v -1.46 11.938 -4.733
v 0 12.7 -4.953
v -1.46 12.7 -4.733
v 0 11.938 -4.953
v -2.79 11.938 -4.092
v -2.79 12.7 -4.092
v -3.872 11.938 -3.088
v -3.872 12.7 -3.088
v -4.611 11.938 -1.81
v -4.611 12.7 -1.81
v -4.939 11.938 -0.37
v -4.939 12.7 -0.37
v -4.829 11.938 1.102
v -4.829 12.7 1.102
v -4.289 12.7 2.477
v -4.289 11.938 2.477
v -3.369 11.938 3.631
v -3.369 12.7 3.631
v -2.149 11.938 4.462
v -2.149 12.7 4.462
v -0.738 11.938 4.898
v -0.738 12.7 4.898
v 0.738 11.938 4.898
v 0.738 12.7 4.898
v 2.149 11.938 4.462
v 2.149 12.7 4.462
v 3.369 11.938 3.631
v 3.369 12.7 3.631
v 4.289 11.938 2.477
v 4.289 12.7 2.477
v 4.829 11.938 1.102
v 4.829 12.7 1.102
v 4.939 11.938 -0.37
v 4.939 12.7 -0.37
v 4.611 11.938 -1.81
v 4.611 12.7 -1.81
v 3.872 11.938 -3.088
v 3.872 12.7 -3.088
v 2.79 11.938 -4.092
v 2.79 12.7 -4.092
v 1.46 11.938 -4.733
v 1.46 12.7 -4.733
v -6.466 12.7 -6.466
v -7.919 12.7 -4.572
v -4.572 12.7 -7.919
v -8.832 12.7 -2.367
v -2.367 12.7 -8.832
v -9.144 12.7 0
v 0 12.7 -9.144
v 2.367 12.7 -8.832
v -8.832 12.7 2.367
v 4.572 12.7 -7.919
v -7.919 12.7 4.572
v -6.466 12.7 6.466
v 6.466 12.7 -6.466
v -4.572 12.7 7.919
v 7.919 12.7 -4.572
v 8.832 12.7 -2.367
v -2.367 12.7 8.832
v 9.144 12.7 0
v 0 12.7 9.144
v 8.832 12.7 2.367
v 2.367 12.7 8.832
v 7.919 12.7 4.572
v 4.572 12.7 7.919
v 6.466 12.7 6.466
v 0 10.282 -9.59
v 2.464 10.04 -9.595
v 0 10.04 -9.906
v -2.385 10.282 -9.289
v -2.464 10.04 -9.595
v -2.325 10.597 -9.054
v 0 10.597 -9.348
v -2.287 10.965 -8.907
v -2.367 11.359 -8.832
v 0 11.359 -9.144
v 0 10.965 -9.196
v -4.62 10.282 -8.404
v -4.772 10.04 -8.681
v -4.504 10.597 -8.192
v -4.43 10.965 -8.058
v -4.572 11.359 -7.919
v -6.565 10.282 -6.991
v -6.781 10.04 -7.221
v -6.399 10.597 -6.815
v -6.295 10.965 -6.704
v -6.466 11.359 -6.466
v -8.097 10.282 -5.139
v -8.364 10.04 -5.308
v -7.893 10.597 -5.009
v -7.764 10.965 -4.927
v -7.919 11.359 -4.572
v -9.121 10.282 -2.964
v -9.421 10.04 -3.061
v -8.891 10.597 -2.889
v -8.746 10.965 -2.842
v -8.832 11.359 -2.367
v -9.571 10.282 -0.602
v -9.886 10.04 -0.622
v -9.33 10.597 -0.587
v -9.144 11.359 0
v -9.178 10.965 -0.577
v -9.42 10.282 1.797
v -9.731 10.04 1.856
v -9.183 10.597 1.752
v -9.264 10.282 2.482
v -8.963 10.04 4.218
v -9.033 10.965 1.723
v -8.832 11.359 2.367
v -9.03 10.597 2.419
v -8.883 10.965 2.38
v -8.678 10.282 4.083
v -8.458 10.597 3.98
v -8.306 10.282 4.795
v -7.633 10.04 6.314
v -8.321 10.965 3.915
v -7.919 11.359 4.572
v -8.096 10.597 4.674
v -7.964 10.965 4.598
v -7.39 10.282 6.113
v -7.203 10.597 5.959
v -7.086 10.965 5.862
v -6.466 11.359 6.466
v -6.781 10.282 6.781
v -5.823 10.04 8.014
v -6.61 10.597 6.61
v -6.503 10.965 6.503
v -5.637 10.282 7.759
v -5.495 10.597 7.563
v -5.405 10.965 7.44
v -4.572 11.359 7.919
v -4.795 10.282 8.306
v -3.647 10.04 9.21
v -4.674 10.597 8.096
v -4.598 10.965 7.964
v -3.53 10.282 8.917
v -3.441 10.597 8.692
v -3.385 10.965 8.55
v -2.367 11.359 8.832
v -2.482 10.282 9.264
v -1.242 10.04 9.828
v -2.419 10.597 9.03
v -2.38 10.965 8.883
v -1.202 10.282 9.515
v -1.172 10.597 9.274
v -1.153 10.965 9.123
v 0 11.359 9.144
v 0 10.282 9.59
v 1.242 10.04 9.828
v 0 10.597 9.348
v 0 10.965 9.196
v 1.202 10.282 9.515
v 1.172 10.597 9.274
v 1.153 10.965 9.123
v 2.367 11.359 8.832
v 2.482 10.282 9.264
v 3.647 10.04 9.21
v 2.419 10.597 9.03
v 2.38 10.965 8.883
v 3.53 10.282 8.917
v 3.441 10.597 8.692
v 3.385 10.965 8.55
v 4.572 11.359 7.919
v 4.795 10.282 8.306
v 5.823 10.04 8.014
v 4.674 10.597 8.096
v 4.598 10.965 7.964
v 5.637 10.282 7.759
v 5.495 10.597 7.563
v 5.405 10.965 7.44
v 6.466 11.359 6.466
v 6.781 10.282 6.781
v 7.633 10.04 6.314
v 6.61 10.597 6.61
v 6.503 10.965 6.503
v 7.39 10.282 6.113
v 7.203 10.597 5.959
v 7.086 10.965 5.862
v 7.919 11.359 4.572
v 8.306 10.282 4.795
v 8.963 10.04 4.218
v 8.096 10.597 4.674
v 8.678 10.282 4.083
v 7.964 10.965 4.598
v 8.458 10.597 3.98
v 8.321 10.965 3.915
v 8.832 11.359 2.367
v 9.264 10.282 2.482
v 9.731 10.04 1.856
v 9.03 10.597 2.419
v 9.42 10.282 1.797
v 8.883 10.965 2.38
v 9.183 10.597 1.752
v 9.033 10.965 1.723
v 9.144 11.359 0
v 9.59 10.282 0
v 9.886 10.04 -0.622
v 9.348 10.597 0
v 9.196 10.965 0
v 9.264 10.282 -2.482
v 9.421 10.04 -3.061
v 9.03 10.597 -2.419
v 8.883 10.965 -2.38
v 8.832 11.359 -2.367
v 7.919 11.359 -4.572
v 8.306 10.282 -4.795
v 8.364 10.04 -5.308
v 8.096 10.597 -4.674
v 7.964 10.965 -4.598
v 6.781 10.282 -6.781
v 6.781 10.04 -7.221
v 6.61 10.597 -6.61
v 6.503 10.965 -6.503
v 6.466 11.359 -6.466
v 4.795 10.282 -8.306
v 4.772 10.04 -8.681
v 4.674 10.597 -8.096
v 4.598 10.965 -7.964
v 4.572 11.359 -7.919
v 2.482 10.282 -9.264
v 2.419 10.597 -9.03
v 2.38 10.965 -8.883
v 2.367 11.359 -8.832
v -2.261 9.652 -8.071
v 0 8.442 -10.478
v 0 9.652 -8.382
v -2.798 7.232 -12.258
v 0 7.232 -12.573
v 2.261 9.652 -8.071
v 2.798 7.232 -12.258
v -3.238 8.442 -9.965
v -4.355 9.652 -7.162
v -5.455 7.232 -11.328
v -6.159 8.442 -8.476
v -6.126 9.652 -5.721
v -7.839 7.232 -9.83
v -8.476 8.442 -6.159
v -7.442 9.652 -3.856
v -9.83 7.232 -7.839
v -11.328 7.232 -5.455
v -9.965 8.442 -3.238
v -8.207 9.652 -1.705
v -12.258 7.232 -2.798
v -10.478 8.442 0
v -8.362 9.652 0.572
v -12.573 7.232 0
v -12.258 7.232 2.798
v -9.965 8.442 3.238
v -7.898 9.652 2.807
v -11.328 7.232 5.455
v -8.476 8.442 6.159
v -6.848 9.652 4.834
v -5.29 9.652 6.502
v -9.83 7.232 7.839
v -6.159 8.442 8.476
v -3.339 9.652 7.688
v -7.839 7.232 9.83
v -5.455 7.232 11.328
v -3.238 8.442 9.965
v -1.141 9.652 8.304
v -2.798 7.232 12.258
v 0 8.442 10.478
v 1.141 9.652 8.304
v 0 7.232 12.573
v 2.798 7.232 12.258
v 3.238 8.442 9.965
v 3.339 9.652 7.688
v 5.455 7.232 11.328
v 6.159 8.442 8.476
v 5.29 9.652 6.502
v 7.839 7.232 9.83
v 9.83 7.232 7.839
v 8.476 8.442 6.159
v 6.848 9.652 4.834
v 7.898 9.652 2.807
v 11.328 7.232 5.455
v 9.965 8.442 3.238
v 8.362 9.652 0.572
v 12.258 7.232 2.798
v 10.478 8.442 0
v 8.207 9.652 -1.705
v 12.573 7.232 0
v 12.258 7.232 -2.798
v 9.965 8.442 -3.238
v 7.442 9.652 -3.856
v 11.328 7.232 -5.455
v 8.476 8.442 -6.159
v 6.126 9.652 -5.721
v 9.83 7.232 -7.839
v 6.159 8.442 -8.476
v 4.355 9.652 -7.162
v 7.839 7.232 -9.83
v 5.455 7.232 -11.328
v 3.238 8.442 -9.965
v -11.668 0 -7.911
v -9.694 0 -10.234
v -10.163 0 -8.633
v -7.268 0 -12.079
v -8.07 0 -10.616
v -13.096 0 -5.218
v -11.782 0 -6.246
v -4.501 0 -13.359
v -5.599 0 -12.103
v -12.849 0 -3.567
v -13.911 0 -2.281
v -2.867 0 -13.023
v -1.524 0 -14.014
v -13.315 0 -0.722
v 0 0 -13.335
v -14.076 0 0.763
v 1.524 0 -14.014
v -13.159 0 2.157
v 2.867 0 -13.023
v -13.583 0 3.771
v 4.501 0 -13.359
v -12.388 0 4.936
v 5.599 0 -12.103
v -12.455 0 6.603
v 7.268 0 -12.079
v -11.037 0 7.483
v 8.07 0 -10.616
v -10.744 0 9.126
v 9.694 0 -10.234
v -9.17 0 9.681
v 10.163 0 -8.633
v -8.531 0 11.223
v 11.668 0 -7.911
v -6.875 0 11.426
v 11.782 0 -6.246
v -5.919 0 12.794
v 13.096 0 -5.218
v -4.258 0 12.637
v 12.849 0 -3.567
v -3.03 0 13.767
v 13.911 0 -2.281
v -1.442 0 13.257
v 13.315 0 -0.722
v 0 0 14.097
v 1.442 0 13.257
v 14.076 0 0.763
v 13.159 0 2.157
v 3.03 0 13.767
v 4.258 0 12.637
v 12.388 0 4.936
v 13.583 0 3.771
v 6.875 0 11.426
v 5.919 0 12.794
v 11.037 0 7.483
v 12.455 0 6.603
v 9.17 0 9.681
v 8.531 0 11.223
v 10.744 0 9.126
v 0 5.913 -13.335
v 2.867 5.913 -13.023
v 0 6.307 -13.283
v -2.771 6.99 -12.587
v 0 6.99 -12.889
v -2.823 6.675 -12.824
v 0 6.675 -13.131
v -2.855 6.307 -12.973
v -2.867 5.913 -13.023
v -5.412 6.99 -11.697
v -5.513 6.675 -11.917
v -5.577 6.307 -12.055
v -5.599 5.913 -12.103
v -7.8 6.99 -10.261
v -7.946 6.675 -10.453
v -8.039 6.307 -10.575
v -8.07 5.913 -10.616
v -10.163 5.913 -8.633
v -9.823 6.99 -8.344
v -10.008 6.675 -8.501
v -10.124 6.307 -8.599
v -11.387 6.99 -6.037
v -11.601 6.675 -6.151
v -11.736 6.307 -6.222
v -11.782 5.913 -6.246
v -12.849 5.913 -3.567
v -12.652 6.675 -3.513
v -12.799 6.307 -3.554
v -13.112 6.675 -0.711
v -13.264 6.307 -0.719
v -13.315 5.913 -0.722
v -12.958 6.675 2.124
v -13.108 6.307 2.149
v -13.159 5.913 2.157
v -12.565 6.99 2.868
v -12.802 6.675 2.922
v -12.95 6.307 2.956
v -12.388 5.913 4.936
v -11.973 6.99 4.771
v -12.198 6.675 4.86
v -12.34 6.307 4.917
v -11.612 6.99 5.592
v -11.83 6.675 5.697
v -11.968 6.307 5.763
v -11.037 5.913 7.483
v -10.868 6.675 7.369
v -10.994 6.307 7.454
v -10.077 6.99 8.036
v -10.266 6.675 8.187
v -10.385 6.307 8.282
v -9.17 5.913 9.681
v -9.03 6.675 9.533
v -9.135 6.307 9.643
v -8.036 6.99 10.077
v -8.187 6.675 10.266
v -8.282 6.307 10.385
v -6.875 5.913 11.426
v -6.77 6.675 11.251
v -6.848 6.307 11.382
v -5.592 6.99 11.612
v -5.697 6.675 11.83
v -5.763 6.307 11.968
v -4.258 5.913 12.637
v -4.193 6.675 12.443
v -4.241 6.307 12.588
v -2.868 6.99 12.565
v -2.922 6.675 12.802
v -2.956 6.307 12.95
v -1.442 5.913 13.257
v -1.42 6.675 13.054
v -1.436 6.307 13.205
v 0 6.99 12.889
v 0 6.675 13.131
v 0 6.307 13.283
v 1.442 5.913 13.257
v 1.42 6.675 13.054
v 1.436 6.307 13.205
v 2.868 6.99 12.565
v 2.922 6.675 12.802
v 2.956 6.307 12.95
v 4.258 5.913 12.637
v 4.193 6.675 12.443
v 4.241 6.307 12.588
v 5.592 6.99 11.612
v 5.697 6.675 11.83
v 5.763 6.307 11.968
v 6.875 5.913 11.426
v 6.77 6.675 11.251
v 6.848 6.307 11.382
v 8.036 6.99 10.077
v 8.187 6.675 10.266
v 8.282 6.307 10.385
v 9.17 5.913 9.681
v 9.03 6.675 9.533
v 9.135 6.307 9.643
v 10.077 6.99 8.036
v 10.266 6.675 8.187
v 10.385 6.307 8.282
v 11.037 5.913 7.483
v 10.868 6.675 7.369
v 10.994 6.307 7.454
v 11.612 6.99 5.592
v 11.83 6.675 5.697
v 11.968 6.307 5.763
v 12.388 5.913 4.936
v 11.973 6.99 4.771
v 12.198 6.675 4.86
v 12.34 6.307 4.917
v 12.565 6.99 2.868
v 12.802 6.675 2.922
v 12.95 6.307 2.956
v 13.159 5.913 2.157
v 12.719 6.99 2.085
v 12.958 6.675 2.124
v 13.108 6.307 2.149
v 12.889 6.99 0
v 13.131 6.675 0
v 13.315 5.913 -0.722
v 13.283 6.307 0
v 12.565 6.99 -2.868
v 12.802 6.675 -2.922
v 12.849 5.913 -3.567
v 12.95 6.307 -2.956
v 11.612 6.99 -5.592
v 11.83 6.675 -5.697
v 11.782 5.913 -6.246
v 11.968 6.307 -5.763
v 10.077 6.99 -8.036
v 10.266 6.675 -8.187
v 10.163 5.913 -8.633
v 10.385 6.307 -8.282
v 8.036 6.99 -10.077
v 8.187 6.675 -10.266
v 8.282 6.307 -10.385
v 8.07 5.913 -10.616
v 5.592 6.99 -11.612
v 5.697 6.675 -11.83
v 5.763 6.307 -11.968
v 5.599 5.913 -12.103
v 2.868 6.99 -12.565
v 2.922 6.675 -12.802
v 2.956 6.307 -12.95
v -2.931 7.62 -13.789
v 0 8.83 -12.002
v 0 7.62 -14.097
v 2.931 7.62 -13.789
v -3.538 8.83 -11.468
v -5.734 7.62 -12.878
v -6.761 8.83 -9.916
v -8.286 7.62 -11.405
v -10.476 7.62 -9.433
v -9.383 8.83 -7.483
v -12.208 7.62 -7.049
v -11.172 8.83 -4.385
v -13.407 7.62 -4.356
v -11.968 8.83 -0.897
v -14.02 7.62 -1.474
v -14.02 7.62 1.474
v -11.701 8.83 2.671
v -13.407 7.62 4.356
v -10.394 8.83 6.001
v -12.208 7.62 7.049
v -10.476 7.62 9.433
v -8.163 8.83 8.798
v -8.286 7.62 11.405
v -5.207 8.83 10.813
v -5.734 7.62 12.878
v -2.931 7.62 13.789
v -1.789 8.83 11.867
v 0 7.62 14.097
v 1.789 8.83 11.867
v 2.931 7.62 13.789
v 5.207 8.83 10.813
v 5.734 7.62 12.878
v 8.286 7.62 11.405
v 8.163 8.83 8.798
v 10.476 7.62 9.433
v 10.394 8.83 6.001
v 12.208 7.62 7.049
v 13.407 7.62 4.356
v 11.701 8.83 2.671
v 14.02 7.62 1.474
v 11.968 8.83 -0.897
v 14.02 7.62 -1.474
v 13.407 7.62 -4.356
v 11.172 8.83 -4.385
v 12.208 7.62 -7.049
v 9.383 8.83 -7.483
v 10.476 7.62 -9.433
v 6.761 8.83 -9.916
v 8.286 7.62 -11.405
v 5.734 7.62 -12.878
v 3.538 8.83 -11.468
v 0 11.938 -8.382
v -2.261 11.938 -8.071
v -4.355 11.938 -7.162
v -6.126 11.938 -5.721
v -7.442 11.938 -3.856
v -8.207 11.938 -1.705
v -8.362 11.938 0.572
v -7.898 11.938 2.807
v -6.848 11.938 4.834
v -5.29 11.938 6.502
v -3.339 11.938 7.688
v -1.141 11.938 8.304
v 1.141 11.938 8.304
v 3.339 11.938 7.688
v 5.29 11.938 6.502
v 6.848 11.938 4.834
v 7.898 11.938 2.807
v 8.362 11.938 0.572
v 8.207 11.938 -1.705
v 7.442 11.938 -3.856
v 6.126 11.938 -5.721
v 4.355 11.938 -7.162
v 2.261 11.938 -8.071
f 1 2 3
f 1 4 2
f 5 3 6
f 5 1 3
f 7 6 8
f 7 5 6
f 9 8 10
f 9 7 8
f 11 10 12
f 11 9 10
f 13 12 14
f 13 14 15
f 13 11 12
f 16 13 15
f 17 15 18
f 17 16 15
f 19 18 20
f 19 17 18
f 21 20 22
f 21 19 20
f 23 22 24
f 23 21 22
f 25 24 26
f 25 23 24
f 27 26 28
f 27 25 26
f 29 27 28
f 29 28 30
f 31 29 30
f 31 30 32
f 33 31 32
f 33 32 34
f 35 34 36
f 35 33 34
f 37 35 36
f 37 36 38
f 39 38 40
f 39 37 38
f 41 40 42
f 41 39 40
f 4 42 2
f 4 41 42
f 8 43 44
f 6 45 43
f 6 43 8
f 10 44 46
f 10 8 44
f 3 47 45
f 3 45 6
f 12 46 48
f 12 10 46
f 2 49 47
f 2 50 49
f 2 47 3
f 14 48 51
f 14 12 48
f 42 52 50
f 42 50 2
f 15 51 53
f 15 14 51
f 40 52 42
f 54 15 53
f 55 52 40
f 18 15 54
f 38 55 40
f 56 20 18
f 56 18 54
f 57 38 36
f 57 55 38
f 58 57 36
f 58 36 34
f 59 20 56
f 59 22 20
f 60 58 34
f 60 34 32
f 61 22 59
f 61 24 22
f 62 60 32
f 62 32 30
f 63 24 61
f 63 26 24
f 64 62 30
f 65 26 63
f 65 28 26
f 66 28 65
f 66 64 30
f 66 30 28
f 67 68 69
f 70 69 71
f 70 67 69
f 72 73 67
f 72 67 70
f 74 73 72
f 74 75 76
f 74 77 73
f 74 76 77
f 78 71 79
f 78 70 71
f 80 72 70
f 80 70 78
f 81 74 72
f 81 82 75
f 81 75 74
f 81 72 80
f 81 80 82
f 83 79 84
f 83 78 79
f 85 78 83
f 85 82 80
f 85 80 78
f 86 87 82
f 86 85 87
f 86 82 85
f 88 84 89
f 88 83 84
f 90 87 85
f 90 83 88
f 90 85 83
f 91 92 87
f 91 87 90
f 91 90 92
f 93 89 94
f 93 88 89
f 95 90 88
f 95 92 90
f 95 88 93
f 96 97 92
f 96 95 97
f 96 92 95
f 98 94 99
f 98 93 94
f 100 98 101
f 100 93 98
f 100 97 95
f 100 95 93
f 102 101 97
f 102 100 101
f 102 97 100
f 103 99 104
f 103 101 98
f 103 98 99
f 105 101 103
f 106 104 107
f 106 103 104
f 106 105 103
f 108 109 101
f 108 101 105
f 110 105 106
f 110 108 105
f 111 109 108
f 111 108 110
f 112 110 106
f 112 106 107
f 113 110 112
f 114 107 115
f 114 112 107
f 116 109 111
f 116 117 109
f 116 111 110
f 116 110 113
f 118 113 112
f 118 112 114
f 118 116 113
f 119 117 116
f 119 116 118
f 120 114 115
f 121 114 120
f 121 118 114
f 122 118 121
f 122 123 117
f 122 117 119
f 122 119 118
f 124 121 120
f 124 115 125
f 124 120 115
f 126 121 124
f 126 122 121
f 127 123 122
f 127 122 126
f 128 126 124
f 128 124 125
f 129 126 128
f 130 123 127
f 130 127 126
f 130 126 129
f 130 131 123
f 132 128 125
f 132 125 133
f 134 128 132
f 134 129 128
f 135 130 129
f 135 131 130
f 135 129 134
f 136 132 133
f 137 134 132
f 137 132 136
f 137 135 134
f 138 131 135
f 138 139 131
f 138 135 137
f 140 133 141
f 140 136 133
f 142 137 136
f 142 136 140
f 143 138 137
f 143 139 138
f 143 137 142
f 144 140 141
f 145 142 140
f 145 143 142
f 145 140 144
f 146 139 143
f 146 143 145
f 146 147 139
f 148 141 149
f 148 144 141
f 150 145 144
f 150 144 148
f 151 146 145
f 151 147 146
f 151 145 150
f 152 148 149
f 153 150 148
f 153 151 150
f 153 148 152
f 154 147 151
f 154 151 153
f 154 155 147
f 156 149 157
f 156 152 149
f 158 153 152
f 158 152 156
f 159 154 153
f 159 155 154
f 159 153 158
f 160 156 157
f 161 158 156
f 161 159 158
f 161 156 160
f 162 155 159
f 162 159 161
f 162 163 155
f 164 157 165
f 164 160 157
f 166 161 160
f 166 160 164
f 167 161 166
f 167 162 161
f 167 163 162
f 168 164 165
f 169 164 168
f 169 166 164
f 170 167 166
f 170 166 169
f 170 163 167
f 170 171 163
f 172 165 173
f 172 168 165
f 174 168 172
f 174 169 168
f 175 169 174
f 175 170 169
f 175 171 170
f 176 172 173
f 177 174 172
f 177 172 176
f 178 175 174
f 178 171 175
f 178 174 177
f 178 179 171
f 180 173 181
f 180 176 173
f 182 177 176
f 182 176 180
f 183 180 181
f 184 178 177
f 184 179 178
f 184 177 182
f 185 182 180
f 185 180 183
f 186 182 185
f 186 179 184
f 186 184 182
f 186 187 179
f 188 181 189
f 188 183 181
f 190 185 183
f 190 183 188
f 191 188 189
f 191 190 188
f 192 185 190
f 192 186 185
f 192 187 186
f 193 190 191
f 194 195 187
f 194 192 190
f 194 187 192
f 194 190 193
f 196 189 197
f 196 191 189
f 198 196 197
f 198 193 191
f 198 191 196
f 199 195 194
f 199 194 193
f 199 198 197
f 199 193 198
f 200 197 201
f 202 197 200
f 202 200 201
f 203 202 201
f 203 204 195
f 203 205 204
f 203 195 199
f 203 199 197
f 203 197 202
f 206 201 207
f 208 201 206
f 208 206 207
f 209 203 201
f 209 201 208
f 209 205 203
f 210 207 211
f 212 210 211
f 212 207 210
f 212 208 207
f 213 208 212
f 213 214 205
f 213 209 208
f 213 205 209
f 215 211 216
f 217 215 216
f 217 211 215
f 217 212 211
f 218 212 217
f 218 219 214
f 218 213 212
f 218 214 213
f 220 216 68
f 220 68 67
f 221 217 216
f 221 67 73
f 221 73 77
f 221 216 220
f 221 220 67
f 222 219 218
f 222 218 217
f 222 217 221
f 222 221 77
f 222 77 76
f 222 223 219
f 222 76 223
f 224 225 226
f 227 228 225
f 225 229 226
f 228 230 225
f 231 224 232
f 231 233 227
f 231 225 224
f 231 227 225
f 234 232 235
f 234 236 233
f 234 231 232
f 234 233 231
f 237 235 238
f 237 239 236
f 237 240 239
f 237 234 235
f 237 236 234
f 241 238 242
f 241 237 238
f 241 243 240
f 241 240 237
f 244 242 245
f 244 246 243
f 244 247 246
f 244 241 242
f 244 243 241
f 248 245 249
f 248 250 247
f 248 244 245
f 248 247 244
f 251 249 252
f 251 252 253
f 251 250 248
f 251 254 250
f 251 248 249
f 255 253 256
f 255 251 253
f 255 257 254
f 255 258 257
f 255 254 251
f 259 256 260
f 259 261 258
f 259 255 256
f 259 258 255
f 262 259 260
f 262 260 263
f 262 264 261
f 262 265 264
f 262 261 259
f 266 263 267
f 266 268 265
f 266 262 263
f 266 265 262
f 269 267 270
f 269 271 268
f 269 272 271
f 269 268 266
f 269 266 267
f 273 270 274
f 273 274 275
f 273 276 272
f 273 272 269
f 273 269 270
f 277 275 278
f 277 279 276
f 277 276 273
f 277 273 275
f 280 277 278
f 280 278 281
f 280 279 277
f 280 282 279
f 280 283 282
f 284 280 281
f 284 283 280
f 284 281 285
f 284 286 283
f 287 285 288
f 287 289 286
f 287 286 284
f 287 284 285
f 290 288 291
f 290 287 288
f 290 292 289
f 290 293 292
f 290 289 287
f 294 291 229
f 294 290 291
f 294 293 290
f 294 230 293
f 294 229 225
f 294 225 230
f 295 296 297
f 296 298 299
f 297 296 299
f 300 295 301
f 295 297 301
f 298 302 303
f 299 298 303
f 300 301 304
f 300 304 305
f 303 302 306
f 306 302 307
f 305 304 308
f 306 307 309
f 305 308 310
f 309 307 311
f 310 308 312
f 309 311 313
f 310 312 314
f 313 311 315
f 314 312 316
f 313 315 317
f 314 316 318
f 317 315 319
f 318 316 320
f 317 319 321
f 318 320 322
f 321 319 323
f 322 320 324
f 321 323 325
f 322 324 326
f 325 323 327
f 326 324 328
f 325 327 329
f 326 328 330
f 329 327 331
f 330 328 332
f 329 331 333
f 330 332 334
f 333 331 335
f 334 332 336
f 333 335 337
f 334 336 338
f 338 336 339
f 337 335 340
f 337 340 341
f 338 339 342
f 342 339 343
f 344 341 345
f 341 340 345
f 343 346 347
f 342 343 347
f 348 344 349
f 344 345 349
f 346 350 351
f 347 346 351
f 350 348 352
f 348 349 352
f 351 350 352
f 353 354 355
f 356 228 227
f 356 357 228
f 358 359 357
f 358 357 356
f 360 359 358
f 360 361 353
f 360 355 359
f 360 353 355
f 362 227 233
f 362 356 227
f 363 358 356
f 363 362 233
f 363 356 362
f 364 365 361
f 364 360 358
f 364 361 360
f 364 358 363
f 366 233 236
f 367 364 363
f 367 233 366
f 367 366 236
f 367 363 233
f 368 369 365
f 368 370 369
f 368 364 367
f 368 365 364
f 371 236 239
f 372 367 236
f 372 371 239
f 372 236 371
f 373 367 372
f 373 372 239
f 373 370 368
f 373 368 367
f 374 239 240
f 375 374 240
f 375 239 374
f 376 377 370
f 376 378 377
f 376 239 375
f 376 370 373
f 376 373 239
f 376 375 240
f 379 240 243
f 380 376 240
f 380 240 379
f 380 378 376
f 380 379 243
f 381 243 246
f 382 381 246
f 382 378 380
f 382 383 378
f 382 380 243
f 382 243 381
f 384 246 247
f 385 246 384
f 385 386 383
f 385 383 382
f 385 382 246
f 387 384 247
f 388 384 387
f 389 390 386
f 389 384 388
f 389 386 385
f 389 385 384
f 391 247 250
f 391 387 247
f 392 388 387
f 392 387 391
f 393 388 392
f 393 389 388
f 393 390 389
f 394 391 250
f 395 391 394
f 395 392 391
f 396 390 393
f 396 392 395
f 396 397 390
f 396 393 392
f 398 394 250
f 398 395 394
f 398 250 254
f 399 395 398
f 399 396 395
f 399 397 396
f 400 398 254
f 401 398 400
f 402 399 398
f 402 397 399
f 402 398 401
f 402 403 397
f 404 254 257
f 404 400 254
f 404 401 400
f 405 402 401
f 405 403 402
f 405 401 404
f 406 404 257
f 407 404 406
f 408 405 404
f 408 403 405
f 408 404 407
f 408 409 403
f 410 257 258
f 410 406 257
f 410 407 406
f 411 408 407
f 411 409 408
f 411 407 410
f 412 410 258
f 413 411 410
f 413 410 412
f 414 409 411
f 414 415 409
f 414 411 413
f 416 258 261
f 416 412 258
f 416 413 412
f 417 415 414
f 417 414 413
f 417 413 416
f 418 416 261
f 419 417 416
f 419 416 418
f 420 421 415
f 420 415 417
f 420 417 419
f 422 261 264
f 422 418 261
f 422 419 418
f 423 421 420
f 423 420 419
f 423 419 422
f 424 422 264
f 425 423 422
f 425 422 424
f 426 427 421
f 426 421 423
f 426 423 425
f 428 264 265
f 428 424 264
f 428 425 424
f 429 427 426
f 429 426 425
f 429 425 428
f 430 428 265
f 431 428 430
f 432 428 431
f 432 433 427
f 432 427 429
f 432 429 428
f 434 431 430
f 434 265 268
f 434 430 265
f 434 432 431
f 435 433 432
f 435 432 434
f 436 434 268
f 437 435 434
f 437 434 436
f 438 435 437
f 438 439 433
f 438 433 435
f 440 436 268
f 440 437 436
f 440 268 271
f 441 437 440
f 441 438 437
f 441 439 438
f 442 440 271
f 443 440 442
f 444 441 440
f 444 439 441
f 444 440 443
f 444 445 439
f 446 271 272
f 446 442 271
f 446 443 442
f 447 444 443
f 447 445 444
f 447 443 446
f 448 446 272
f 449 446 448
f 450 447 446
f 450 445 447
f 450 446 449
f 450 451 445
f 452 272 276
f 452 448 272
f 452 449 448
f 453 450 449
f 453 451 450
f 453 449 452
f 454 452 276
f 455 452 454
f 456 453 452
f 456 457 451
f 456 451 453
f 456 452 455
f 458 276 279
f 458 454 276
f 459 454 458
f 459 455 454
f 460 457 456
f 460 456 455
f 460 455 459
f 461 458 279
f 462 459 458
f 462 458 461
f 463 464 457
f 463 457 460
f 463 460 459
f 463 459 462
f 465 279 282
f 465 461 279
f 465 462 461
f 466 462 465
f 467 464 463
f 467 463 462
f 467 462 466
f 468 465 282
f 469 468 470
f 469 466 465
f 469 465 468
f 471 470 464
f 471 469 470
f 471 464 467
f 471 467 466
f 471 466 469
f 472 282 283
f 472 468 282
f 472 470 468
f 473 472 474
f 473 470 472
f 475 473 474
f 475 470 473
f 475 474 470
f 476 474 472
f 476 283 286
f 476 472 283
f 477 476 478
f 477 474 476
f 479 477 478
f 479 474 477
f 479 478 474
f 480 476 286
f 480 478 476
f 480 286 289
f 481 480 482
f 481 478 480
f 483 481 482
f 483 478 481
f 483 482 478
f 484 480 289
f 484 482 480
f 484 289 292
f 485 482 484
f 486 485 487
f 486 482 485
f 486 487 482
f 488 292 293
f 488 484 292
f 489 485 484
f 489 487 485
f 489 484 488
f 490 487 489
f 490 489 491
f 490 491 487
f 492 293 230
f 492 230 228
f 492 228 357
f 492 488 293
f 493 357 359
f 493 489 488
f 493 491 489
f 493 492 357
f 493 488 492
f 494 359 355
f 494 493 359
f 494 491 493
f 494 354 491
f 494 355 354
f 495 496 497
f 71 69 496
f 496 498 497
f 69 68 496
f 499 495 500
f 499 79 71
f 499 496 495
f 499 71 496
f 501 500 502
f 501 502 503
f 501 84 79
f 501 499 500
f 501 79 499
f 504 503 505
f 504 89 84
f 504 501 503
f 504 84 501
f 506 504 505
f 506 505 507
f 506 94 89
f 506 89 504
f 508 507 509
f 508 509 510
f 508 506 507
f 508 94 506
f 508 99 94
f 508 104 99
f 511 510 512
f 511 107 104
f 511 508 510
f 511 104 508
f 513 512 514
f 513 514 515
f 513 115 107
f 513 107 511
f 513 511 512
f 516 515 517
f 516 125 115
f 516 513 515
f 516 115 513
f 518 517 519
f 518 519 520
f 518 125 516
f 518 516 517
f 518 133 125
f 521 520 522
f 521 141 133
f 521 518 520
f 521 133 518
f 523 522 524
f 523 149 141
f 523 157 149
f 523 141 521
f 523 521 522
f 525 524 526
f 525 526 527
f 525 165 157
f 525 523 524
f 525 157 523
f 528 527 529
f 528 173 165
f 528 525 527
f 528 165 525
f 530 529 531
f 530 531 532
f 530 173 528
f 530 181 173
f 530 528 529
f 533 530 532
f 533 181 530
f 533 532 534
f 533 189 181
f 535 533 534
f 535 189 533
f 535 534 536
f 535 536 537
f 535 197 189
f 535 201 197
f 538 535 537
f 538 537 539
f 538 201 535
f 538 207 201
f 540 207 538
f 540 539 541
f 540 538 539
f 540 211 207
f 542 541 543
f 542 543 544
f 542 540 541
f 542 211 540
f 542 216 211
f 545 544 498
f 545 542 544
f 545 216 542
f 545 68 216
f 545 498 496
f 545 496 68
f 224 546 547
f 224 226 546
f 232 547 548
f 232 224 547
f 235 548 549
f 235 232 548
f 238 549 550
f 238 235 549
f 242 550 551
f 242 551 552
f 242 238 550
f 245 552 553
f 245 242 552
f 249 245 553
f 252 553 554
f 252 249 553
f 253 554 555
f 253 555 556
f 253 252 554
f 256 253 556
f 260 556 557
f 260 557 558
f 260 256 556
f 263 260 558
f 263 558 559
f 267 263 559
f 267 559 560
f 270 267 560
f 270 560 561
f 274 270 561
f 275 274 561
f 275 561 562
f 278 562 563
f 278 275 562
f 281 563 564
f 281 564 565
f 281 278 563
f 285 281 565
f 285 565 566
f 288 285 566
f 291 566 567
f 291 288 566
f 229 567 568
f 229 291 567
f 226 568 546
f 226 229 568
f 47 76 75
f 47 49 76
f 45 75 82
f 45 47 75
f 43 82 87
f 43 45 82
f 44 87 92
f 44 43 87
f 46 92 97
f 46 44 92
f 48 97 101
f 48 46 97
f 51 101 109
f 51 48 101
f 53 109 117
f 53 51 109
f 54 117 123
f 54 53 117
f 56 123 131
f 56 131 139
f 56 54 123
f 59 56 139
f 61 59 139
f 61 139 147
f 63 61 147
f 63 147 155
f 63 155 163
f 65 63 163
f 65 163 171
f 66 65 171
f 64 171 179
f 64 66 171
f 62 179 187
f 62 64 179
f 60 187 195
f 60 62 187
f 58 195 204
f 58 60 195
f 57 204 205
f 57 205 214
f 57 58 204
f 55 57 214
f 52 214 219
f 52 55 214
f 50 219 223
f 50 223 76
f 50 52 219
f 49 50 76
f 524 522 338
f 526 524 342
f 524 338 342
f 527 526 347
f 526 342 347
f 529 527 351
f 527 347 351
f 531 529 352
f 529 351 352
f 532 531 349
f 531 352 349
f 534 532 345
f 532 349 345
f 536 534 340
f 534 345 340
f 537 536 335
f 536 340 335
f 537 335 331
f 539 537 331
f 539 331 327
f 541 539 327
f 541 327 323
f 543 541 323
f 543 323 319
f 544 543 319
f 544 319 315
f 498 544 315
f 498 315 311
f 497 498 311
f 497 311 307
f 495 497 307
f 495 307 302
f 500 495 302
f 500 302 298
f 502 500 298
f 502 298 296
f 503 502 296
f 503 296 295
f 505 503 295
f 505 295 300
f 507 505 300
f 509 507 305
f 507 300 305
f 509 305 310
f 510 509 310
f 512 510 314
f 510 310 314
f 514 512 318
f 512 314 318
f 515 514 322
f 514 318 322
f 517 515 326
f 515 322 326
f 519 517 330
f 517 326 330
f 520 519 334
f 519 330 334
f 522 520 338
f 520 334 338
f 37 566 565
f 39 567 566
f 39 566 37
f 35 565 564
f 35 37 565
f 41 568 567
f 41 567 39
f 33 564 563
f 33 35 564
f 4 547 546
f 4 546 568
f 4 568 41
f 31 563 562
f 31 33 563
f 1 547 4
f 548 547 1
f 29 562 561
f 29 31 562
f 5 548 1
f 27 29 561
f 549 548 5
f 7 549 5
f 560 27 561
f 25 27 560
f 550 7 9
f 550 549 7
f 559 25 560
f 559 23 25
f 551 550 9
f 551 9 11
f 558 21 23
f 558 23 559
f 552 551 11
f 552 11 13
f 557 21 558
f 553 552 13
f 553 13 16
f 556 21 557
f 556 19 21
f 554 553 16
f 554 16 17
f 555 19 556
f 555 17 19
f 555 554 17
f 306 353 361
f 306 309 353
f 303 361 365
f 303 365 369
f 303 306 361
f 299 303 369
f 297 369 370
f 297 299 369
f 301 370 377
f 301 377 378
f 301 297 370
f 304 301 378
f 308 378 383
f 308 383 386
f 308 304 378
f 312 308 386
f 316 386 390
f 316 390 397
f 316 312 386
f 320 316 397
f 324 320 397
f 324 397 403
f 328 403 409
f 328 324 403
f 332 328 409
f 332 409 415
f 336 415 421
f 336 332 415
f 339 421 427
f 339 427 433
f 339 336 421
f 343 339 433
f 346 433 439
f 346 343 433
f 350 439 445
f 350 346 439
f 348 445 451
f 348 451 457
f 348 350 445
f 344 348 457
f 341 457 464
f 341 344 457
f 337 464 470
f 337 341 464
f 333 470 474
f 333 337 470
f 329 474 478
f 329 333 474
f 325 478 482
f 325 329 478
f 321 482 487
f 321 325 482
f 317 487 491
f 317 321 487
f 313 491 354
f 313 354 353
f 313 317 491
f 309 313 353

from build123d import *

# Parameters (mm, degrees)
SKETCH1_R           = 14.097
BOSS_EXTRUDE1_DEPTH = 12.7


with BuildPart() as part:
    # Sketch1 → Boss-Extrude1 (new body)
    with BuildSketch(Plane(origin=(0, 0, 0), x_dir=(1, 0, 0), z_dir=(0, 1, 0))):
        with Locations(Location((0, 0, 0), (0, 0, 270))):  # turned: the seam where the file's is
            Circle(SKETCH1_R)
    extrude(amount=BOSS_EXTRUDE1_DEPTH)

    # Sketch2 → Cut-Revolve1 (revolve, cut)
    with BuildSketch(Plane.XY, mode=Mode.PRIVATE) as cut_revolve1_sk:
        with BuildLine():
            Line((4.953, 12.7), (4.953, 11.938))
            Line((4.953, 11.938), (8.382, 11.938))
            Line((8.382, 11.938), (8.382, 9.652))
            Line((8.382, 9.652), (12.573, 7.232325022))
            ThreePointArc((12.573, 7.232325022), (13.130822715, 6.674502306), (13.335, 5.912502306))
            Line((13.335, 5.912502306), (13.335, 0))
            Line((13.335, 0), (0, 0))
            Line((0, 0), (0, 12.7))
            Line((0, 12.7), (4.953, 12.7))
        make_face()
    revolve(cut_revolve1_sk.sketch.rotate(Axis((0, 0, 0), (0, 1, 0)), 90), axis=Axis((0, 0, 0), (0, 1, 0)), mode=Mode.SUBTRACT)  # turned: the seam where the file's is

    # Sketch3 → Cut-Revolve2 (revolve, cut)
    with BuildSketch(Plane.XY, mode=Mode.PRIVATE) as cut_revolve2_sk:
        with BuildLine():
            Line((14.097, 12.7), (14.097, 7.62))
            Line((14.097, 7.62), (9.906, 10.039674978))
            ThreePointArc((9.906, 10.039674978), (9.348177285, 10.597497694), (9.144, 11.359497694))
            Line((9.144, 11.359497694), (9.144, 12.7))
            Line((9.144, 12.7), (14.097, 12.7))
        make_face()
    revolve(cut_revolve2_sk.sketch.rotate(Axis((0, 0, 0), (0, 1, 0)), 90), axis=Axis((0, 0, 0), (0, 1, 0)), mode=Mode.SUBTRACT)  # turned: the seam where the file's is


solid = part.part
